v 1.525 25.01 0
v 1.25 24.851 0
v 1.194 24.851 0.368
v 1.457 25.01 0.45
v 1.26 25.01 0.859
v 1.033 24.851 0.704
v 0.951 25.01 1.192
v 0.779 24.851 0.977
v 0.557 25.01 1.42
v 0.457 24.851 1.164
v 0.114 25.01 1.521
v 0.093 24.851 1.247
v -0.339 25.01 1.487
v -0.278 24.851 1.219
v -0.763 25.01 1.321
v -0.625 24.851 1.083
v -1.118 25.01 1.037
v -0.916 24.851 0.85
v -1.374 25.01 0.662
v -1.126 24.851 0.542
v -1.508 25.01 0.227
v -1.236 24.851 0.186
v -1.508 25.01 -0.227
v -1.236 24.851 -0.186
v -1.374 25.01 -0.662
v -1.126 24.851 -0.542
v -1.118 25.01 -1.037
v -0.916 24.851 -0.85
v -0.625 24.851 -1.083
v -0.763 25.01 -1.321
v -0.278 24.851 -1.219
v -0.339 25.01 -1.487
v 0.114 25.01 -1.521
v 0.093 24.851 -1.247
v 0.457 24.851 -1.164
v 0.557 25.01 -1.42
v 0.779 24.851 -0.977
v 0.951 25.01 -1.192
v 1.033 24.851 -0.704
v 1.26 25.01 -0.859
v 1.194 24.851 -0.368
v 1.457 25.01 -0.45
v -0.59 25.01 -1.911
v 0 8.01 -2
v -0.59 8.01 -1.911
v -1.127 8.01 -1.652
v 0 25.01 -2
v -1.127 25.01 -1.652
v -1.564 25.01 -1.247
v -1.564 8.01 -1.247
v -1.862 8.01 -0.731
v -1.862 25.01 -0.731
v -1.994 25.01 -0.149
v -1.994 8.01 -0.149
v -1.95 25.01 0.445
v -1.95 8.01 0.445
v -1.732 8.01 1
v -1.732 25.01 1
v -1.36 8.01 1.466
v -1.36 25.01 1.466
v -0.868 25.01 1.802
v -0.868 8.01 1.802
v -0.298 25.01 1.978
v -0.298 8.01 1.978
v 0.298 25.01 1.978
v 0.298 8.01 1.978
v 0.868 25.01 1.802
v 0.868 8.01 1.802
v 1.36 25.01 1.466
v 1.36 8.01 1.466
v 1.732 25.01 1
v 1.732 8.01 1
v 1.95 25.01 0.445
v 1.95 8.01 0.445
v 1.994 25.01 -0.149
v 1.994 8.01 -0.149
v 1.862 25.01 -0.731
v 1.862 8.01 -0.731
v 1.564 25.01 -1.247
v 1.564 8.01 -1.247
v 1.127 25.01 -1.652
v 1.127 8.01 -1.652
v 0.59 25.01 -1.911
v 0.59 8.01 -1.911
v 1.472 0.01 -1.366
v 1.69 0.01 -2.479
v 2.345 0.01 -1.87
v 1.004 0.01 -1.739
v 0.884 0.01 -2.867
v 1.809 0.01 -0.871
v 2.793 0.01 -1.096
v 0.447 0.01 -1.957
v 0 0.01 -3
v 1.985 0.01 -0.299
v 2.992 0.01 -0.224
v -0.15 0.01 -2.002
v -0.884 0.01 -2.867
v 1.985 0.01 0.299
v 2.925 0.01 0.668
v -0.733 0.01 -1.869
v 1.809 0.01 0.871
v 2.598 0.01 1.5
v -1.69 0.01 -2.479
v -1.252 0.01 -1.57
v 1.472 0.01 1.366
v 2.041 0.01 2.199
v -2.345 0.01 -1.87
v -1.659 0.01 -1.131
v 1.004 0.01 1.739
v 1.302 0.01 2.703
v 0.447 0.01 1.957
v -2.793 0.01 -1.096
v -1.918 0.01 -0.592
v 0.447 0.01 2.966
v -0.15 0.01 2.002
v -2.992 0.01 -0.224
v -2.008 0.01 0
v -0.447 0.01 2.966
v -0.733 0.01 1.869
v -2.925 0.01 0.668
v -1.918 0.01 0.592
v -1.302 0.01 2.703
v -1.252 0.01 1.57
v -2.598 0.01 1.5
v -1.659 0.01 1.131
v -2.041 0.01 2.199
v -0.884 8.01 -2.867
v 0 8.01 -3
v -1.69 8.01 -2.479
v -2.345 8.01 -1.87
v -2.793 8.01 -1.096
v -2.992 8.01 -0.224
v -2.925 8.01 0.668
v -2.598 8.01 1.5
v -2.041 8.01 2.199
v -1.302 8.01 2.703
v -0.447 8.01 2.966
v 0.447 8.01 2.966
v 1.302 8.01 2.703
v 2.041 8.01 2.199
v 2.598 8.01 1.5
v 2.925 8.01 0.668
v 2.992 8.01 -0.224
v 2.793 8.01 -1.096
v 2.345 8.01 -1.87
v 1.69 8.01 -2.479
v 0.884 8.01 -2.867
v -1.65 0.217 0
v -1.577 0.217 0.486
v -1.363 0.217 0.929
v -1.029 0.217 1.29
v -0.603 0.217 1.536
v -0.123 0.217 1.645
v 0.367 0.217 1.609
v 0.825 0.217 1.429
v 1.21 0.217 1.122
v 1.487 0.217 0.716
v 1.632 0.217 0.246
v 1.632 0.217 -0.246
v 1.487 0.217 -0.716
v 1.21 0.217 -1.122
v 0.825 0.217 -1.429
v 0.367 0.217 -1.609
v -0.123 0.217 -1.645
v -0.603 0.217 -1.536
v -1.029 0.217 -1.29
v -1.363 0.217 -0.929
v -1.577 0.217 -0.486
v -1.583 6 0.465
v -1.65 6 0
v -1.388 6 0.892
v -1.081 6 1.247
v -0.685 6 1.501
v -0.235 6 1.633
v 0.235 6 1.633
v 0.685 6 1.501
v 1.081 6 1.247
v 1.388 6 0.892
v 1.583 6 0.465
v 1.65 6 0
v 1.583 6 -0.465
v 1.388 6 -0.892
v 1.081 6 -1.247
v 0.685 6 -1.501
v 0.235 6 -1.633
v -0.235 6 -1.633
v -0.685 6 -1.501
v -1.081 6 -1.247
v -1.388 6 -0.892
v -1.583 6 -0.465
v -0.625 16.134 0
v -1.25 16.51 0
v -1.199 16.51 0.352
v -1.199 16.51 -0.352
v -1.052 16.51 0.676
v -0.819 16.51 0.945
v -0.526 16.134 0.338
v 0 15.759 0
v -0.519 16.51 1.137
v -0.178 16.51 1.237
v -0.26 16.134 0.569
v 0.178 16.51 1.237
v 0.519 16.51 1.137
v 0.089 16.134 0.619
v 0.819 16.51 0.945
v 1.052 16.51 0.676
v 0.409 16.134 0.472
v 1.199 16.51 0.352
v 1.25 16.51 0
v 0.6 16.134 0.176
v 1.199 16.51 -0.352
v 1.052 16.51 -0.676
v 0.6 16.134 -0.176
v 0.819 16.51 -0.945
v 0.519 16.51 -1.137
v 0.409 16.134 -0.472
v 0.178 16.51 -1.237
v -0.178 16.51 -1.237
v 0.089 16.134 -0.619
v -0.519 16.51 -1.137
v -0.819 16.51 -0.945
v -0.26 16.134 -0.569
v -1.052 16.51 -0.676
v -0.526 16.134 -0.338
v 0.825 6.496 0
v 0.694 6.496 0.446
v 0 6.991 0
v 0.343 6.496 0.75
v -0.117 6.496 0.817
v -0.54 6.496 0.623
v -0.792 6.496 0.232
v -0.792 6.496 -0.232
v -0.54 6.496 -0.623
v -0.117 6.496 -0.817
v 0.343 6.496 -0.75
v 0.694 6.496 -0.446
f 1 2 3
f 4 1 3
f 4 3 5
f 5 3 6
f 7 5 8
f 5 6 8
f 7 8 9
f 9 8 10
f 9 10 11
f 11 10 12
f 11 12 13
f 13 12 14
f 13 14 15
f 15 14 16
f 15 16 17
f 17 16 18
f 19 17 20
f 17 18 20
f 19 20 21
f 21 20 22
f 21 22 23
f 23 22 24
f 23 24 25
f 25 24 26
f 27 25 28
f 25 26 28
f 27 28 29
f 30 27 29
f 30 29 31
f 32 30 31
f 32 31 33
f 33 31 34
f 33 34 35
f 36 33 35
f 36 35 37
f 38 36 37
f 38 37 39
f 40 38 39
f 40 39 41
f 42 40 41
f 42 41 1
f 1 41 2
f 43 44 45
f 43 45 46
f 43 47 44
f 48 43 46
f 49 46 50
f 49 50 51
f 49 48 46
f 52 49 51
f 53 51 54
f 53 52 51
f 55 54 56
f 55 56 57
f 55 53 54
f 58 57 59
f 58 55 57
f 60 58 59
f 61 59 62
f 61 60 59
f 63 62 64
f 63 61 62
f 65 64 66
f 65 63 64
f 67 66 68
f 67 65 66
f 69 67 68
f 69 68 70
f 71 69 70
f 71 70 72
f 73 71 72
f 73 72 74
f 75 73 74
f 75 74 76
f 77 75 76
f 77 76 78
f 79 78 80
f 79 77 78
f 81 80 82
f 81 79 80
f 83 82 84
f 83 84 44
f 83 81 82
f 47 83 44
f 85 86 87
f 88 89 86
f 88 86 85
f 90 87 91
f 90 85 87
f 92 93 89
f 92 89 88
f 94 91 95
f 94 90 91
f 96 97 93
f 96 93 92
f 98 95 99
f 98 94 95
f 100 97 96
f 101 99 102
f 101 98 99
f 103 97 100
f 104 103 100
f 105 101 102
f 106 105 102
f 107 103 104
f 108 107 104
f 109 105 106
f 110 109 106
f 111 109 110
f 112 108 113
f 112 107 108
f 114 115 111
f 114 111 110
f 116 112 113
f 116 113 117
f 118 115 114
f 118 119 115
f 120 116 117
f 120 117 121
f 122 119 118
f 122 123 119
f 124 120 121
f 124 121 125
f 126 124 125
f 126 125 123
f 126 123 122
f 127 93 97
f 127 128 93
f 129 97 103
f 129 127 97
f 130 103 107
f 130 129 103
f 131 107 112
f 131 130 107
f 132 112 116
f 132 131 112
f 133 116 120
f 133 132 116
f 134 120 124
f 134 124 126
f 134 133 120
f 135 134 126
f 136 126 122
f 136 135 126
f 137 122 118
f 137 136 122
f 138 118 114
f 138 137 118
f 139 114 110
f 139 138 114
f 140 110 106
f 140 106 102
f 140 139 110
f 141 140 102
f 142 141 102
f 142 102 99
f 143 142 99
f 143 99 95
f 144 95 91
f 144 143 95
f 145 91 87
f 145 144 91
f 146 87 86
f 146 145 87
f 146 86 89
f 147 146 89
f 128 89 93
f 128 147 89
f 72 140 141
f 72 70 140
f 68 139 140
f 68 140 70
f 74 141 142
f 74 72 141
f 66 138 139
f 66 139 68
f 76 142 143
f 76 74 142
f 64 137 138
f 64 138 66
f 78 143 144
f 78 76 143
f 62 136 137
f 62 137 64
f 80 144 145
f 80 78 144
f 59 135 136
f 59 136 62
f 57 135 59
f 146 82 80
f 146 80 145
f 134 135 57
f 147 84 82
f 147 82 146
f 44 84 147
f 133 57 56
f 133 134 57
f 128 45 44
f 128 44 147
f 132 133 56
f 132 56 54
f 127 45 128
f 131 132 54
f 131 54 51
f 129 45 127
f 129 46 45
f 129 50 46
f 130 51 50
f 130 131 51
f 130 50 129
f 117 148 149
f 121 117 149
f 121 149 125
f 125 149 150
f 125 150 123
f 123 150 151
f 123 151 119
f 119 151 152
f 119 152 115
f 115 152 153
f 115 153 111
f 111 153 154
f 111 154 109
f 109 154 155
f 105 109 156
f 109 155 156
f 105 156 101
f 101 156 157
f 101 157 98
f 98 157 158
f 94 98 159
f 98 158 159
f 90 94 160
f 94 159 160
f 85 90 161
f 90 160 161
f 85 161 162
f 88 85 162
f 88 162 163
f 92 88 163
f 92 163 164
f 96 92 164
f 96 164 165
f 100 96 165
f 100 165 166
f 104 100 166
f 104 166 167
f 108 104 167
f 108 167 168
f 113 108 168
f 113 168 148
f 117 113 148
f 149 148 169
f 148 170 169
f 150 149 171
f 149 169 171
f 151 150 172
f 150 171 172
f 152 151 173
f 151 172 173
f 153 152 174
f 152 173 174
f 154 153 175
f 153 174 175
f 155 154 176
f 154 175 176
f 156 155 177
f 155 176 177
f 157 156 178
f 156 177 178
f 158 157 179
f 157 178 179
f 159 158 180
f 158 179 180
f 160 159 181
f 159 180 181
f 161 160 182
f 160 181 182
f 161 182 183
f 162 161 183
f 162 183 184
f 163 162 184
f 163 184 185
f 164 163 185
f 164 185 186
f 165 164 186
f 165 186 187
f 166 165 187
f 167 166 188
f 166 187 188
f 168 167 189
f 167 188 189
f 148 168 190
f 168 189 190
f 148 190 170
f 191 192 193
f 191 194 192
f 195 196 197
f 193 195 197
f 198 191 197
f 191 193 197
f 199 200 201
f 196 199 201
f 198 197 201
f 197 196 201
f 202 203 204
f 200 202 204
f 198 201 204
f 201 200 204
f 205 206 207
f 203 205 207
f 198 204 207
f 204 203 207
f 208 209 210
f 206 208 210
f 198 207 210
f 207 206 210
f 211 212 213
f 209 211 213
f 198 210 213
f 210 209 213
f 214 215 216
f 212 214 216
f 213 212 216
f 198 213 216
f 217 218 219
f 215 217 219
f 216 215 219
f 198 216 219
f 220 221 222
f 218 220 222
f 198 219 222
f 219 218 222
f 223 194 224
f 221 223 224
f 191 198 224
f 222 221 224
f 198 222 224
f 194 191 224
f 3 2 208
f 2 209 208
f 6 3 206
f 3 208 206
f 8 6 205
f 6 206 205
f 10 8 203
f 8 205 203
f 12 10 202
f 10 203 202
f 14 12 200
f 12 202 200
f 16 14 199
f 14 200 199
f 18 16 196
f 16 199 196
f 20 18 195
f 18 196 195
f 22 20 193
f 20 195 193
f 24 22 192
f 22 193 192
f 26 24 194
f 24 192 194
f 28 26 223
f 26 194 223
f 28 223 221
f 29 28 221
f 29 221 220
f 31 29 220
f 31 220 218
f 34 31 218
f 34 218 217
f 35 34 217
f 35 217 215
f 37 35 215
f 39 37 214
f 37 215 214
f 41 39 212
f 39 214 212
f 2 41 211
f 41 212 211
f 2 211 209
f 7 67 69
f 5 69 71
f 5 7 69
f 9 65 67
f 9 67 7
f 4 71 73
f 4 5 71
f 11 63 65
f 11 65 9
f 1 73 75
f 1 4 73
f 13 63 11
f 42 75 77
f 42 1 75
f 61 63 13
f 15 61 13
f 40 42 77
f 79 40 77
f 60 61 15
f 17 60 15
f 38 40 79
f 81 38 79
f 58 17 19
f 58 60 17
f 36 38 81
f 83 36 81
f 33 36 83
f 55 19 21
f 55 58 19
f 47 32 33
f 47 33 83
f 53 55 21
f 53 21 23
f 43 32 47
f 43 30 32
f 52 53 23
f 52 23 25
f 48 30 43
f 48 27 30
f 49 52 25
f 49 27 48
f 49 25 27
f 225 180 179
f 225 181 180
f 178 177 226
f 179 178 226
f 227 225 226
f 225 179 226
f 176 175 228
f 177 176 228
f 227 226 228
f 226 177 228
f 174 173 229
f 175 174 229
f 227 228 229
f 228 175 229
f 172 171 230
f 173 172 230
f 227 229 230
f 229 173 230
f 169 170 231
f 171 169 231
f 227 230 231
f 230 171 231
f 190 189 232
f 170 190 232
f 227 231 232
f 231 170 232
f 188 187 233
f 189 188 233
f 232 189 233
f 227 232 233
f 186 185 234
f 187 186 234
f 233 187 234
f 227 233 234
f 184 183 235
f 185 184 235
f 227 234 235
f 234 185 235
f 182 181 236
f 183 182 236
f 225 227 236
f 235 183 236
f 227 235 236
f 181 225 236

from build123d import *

# Parameters (mm, degrees)
HOLE_WIZARD_M32_D           = 2.5
HOLE_WIZARD_M32_DEPTH       = 8.5
HOLE_WIZARD_M32_CSINK_D     = 3.05
HOLE_WIZARD_M32_CSINK_ANGLE = 120
HOLE_WIZARD_M32_TIP         = 0.751075774
HOLE_WIZARD_1_D             = 3.3
HOLE_WIZARD_1_DEPTH         = 6
HOLE_WIZARD_1_CSINK_D       = 4.05
HOLE_WIZARD_1_CSINK_ANGLE   = 120
HOLE_WIZARD_1_TIP           = 0.991420021


with BuildPart() as part:
    # Эскиз2 → Повернуть1 (revolve)
    with BuildSketch(Plane(origin=(0, 0, 0), x_dir=(0, 0, -1), z_dir=(1, 0, 0))):
        Polygon((0, 0), (2, 0), (2, 0.01), (3, 0.01), (3, 8.01), (2, 8.01), (2, 25.01), (0, 25.01), align=None)
    revolve(axis=Axis((0, 0, 0), (0, 1, 0)))

    # Отверстие обработанное метчиком M32
    with Locations(Plane(origin=(0, 25.01, 0), x_dir=(-1, 0, 0), z_dir=(0, 1, 0))):
        with Locations((0, 0)):
            CounterSinkHole(HOLE_WIZARD_M32_D / 2, HOLE_WIZARD_M32_CSINK_D / 2, depth=HOLE_WIZARD_M32_DEPTH, counter_sink_angle=HOLE_WIZARD_M32_CSINK_ANGLE)
            with Locations((0, 0, -(HOLE_WIZARD_M32_DEPTH + HOLE_WIZARD_M32_TIP / 2))):  # 118° drill point
                Cone(0, HOLE_WIZARD_M32_D / 2, HOLE_WIZARD_M32_TIP, mode=Mode.SUBTRACT)

    # Отверстие обработанное метчиком 1
    with Locations(Plane.XZ):
        with Locations((0, 0)):
            CounterSinkHole(HOLE_WIZARD_1_D / 2, HOLE_WIZARD_1_CSINK_D / 2, depth=HOLE_WIZARD_1_DEPTH, counter_sink_angle=HOLE_WIZARD_1_CSINK_ANGLE)
            with Locations((0, 0, -(HOLE_WIZARD_1_DEPTH + HOLE_WIZARD_1_TIP / 2))):  # 118° drill point
                Cone(0, HOLE_WIZARD_1_D / 2, HOLE_WIZARD_1_TIP, mode=Mode.SUBTRACT)


solid = part.part
